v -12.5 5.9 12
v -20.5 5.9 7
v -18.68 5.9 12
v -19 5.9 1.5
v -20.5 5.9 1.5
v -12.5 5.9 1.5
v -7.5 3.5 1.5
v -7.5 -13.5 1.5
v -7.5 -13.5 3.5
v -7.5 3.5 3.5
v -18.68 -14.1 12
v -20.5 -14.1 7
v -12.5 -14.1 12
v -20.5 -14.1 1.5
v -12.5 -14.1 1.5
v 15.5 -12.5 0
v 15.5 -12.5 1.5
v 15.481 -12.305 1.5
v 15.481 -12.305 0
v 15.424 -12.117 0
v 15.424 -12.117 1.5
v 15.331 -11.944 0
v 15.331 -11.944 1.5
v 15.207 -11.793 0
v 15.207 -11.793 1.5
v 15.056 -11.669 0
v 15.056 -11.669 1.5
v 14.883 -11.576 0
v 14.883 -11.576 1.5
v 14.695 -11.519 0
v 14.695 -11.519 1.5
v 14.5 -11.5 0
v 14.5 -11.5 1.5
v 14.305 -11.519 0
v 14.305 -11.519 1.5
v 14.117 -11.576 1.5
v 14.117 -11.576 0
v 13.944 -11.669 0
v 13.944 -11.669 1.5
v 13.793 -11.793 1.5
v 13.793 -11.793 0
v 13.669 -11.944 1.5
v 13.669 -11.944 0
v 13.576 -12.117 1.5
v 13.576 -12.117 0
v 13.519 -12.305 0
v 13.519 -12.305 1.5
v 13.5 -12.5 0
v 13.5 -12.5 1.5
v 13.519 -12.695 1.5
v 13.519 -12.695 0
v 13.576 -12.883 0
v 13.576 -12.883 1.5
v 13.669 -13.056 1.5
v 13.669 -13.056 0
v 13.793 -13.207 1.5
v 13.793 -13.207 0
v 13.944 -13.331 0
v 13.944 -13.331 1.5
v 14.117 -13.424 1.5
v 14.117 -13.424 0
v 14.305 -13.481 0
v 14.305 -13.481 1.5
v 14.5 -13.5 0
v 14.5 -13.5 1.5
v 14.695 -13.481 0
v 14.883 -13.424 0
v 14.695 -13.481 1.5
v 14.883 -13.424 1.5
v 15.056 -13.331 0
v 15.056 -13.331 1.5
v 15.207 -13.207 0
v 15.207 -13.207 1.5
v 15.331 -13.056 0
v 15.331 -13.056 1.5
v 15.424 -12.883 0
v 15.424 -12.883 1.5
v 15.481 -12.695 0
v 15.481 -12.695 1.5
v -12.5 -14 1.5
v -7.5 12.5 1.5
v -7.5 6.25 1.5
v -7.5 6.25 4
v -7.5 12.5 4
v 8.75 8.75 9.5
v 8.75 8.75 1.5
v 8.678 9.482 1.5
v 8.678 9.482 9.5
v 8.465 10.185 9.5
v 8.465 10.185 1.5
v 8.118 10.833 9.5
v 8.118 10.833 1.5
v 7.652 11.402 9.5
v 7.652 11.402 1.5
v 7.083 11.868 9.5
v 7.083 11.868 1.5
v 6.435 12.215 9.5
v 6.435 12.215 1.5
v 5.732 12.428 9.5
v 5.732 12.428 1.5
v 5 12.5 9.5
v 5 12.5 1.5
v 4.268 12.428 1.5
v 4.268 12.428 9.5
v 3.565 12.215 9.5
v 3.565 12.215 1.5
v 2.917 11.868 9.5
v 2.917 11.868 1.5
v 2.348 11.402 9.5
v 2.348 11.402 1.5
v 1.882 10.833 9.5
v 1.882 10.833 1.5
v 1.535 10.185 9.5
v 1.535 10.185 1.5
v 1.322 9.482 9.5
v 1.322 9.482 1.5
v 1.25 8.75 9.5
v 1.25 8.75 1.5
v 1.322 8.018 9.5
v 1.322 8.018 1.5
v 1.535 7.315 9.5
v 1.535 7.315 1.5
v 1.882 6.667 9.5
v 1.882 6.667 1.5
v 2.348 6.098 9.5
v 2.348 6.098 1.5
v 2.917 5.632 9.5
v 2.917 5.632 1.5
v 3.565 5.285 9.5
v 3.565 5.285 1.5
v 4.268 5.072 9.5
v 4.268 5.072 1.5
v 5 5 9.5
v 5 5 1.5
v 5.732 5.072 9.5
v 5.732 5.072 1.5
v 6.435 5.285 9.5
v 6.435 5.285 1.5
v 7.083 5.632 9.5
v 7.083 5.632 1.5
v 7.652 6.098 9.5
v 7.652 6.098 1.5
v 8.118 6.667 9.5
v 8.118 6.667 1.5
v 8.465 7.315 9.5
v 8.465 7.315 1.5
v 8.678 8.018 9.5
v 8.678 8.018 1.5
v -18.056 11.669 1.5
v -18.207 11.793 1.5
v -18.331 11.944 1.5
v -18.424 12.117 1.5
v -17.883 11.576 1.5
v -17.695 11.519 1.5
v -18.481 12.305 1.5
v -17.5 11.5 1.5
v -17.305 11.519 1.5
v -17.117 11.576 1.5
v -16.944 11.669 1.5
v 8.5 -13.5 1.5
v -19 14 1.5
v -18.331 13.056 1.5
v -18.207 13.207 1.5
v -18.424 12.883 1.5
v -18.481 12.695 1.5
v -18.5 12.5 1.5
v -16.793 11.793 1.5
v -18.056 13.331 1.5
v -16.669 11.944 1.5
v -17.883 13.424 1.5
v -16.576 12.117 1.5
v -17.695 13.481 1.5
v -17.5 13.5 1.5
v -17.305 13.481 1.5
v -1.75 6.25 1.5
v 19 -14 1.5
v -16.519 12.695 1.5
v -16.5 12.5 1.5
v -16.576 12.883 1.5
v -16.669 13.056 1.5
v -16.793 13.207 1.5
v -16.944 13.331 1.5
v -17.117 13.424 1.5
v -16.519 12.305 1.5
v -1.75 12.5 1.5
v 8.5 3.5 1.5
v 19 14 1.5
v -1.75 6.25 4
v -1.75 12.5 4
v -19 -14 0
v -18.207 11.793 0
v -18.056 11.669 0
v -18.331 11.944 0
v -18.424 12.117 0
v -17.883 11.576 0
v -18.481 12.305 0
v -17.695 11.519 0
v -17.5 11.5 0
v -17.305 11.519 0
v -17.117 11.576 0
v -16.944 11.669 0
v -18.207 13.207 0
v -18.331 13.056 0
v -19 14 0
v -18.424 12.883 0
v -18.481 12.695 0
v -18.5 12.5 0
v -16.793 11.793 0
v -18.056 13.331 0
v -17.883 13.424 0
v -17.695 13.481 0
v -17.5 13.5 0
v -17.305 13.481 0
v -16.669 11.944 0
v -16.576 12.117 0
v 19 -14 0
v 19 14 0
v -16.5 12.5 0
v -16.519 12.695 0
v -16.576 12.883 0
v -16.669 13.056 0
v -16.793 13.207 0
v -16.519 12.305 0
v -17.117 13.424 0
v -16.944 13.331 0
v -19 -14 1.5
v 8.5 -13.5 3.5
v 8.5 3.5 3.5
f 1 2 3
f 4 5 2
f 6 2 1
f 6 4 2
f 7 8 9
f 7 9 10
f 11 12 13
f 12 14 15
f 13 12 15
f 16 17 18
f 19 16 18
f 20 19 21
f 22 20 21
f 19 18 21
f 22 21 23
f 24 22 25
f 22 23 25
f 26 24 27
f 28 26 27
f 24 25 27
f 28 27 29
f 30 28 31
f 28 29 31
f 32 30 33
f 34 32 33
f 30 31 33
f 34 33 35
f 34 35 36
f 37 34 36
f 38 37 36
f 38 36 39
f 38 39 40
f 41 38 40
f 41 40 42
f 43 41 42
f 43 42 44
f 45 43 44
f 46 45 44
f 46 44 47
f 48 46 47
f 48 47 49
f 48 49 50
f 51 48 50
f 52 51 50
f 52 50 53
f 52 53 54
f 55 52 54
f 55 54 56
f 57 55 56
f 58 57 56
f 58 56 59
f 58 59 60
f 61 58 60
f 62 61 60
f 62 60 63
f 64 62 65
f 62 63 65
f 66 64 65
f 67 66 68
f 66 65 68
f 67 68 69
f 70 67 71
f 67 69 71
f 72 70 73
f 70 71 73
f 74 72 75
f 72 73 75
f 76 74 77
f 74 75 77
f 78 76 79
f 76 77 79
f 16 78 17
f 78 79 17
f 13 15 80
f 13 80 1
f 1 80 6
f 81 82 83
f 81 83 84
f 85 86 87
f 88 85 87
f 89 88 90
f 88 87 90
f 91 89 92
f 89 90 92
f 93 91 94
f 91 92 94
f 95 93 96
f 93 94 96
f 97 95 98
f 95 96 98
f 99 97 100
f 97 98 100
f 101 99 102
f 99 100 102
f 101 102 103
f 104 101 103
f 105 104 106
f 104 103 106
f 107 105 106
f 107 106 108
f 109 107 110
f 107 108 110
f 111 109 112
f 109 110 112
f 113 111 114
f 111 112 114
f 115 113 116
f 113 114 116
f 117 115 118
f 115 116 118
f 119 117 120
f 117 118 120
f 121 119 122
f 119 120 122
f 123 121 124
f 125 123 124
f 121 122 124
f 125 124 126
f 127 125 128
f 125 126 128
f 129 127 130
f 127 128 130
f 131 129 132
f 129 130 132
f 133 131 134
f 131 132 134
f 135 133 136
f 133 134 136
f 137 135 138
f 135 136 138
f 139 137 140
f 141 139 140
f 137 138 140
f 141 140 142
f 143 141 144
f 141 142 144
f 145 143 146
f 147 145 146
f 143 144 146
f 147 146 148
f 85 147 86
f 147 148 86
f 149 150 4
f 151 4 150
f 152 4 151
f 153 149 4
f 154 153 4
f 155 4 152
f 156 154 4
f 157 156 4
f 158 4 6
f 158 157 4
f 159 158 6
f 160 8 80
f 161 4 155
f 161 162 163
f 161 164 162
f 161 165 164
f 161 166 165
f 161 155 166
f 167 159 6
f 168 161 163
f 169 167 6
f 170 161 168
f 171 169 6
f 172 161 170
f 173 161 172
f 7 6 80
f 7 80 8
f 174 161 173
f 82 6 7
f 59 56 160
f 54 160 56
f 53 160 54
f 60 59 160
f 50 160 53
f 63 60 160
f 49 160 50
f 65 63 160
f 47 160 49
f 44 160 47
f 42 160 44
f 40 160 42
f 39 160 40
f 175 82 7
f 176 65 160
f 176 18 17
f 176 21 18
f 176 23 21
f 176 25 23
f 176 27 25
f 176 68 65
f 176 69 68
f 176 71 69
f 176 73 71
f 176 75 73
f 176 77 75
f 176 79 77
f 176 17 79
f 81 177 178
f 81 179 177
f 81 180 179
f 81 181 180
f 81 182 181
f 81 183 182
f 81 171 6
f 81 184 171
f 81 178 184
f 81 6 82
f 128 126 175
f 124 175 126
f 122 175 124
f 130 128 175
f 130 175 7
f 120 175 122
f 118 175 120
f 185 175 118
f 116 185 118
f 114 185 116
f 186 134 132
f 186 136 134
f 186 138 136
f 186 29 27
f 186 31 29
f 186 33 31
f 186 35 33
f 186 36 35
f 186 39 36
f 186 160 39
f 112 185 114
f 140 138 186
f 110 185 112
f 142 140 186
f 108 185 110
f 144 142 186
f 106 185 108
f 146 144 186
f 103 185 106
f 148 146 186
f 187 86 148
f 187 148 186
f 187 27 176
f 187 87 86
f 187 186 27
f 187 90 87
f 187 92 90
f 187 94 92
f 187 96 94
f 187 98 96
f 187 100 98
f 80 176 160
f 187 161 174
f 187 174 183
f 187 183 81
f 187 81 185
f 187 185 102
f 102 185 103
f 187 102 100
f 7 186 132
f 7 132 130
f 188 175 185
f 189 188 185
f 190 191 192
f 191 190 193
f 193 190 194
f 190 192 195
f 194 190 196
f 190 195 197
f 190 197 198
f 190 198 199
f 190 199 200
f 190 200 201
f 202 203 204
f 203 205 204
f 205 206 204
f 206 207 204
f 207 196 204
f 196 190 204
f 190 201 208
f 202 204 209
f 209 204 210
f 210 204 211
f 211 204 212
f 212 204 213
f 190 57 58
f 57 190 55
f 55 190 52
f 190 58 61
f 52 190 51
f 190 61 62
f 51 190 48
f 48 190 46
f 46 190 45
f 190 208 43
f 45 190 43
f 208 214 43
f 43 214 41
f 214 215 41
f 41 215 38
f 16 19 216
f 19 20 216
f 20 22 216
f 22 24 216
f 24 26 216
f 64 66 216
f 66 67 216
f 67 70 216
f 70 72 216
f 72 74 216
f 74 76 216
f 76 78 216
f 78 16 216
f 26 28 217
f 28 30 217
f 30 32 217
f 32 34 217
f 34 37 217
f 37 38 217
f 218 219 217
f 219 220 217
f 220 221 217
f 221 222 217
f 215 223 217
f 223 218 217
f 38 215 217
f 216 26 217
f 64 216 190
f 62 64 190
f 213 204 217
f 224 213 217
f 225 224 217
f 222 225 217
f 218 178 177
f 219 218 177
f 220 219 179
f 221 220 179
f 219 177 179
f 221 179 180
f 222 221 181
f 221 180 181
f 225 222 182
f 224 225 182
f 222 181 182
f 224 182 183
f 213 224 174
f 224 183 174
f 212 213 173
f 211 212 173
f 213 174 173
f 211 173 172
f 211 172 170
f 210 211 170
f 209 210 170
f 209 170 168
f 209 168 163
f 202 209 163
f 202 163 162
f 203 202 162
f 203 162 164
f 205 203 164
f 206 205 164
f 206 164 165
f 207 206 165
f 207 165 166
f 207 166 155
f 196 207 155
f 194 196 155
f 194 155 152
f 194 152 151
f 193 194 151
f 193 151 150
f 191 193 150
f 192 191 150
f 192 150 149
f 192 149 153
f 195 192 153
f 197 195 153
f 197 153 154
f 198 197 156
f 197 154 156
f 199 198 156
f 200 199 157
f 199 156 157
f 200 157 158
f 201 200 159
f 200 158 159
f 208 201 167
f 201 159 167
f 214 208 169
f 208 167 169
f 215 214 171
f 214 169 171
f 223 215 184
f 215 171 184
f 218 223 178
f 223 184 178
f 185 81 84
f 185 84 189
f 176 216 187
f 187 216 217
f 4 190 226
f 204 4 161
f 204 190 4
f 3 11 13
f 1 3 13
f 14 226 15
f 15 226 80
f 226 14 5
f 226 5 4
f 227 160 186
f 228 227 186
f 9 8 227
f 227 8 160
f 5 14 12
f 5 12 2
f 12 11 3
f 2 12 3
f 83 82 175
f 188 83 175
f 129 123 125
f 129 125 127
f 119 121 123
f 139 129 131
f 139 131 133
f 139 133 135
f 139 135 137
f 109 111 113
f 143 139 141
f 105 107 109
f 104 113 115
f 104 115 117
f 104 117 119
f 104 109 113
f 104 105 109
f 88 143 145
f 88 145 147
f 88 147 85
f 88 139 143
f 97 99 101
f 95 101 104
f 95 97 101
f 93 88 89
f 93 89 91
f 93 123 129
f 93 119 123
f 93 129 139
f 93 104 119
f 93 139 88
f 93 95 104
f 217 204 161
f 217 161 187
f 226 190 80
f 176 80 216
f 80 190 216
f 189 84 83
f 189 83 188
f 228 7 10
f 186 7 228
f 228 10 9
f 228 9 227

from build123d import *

# Parameters (mm, degrees)
SKETCH1_W           = 38
SKETCH1_H           = 28
BOSS_EXTRUDE1_DEPTH = 1.5
SKETCH2_R           = 3.75
BOSS_EXTRUDE2_DEPTH = 8
SKETCH3_W           = 5.75
SKETCH3_H           = 6.25
BOSS_EXTRUDE3_DEPTH = 2.5
SKETCH4_W           = 16
SKETCH4_H           = 17
BOSS_EXTRUDE4_DEPTH = 2
SKETCH5_R           = 1
CUT_EXTRUDE1_DEPTH  = 2
SKETCH7_R           = 1
CUT_EXTRUDE3_DEPTH  = 2
SKETCH8_W           = 8
SKETCH8_H           = 20
BOSS_EXTRUDE5_DEPTH = 10.5
CHAMFER1_SIZE       = 5
CHAMFER1_SIZE2      = 1.819851171


with BuildPart() as part:
    # Sketch1 → Boss-Extrude1 (new body)
    with BuildSketch(Plane.XY):
        Rectangle(SKETCH1_W, SKETCH1_H)
    extrude(amount=BOSS_EXTRUDE1_DEPTH)

    # Sketch2 → Boss-Extrude2 (add)
    with BuildSketch(Plane.XY.offset(1.5)):
        with Locations((5, 8.75)):
            Circle(SKETCH2_R)
    extrude(amount=BOSS_EXTRUDE2_DEPTH)

    # Sketch3 → Boss-Extrude3 (add)
    with BuildSketch(Plane.XY.offset(1.5)):
        with Locations((-4.625, 9.375)):
            Rectangle(SKETCH3_W, SKETCH3_H)
    extrude(amount=BOSS_EXTRUDE3_DEPTH)

    # Sketch4 → Boss-Extrude4 (add)
    with BuildSketch(Plane.XY.offset(1.5)):
        with Locations((0.5, -5)):
            Rectangle(SKETCH4_W, SKETCH4_H)
    extrude(amount=BOSS_EXTRUDE4_DEPTH)

    # Sketch5 → Cut-Extrude1 (cut)
    with BuildSketch(Plane.XY.offset(1.5)):
        with Locations((14.5, -12.5)):
            Circle(SKETCH5_R)
    extrude(amount=-CUT_EXTRUDE1_DEPTH, mode=Mode.SUBTRACT)

    # Sketch7 → Cut-Extrude3 (cut)
    with BuildSketch(Plane.XY.offset(1.5)):
        with Locations((-17.5, 12.5)):
            Circle(SKETCH7_R)
    extrude(amount=-CUT_EXTRUDE3_DEPTH, mode=Mode.SUBTRACT)

    # Sketch8 → Boss-Extrude5 (add)
    with BuildSketch(Plane.XY.offset(1.5)):
        with Locations((-16.5, -4.1)):
            Rectangle(SKETCH8_W, SKETCH8_H)
    extrude(amount=BOSS_EXTRUDE5_DEPTH)

    # Chamfer1
    chamfer1_edges = [part.edges().sort_by_distance(p)[0] for p in [
        (-20.5, -4.1, 12),
    ]]
    chamfer1_side = [part.faces().sort_by_distance(p)[0] for p in [
        (-20.5, -4.1, 6.75),
    ]]
    chamfer(chamfer1_edges, length=CHAMFER1_SIZE, length2=CHAMFER1_SIZE2, reference=chamfer1_side[0])


solid = part.part
